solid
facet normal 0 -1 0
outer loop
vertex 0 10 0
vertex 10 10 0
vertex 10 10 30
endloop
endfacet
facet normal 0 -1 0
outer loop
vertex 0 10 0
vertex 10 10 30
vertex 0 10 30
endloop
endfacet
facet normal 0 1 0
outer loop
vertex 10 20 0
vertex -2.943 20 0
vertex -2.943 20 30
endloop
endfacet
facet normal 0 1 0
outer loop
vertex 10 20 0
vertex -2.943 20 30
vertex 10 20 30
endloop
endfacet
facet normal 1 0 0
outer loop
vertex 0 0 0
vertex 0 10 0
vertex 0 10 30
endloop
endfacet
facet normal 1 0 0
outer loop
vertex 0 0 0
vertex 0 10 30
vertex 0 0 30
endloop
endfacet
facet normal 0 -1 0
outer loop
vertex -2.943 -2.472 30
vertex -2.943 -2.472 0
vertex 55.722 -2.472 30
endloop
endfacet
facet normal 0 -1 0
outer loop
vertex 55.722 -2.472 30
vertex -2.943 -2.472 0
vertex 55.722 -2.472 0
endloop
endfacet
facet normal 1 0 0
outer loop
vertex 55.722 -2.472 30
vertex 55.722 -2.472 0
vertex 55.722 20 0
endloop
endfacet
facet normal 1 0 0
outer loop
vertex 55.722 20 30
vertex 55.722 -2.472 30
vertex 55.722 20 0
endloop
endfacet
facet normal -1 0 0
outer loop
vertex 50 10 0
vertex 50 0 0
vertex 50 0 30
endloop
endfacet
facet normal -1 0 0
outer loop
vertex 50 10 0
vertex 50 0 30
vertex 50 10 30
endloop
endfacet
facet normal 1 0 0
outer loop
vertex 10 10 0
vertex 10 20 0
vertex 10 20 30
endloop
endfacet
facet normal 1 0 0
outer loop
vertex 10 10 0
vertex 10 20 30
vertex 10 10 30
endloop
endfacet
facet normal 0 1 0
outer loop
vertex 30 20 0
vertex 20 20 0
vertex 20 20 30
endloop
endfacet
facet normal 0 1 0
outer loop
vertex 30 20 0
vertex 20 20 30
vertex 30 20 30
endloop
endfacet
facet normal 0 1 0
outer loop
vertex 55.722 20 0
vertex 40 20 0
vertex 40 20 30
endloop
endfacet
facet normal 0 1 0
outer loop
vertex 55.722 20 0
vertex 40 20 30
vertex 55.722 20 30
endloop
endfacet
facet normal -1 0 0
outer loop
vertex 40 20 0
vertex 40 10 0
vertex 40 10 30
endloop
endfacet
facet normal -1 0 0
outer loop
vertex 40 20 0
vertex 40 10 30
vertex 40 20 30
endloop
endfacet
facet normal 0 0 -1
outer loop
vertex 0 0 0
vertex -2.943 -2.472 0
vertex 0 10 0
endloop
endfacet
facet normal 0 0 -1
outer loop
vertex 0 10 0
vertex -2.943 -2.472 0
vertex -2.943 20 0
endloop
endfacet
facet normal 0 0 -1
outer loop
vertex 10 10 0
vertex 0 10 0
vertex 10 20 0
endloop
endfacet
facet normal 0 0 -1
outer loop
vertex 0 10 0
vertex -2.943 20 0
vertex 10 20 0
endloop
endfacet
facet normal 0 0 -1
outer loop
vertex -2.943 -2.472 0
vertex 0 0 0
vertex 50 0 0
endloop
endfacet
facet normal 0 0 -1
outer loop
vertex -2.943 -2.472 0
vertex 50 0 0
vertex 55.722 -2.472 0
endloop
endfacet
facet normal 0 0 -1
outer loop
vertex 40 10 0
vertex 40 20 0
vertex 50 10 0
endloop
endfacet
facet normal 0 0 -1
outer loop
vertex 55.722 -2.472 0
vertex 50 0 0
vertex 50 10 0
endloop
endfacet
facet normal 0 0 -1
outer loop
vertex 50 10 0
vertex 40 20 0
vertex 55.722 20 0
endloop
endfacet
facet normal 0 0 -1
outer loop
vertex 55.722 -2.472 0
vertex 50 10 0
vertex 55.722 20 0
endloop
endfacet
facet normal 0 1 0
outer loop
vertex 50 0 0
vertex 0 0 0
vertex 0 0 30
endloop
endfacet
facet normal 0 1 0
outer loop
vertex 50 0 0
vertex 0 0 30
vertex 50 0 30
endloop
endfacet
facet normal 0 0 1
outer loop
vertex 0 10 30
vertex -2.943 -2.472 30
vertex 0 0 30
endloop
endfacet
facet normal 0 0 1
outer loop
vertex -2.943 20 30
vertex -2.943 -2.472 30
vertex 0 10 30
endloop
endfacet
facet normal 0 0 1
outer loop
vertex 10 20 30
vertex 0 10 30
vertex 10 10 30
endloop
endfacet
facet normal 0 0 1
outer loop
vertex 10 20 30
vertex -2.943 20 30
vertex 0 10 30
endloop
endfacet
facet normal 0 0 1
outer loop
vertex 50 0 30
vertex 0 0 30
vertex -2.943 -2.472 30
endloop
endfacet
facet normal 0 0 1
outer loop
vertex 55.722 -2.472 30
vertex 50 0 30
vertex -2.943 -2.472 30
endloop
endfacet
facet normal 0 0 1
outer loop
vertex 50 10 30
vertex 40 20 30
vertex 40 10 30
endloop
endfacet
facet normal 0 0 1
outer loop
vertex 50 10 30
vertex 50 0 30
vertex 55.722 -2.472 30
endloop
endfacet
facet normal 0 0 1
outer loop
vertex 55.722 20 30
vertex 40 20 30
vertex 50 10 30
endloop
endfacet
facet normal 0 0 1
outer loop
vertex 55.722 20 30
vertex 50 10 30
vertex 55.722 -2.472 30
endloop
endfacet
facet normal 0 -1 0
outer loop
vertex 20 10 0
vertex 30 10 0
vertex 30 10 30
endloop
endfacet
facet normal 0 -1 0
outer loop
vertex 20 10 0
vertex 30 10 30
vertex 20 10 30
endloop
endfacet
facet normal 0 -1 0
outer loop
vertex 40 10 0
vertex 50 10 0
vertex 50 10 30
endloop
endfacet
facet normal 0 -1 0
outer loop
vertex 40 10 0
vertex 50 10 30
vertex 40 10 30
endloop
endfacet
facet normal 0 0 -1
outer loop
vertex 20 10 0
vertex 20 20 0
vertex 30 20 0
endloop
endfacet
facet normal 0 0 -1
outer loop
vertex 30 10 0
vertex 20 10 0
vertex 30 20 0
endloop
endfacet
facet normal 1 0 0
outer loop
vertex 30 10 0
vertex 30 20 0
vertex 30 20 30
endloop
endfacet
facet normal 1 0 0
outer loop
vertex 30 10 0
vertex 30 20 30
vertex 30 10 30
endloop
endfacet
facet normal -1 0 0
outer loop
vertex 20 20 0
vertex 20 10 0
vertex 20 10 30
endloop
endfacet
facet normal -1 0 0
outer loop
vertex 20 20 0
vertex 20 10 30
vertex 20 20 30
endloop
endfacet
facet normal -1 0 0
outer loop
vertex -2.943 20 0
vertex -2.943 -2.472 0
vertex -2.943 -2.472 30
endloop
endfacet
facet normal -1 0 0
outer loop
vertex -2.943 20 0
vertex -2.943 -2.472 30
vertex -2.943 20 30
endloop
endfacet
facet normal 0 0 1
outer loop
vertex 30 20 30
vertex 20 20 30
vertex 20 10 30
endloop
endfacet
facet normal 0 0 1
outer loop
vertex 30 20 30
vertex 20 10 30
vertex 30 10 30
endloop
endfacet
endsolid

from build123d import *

# Parameters (mm, degrees)
SKETCH3_W           = 58.664947722
SKETCH3_H           = 22.471826884
BOSS_EXTRUDE2_DEPTH = 30
CUT_EXTRUDE1_DEPTH  = 31


with BuildPart() as part:
    # Sketch3 → Boss-Extrude2 (new body)
    with BuildSketch(Plane.XY):
        with Locations((26.389266792, 8.764086558)):
            Rectangle(SKETCH3_W, SKETCH3_H)
    extrude(amount=BOSS_EXTRUDE2_DEPTH)

    # Sketch2 → Cut-Extrude1 (cut, through all)
    with BuildSketch(Plane.XY):
        Polygon((0, 0), (50, 0), (50, 10), (40, 10), (40, 20), (30, 20), (30, 10), (20, 10), (20, 20), (10, 20), (10, 10), (0, 10), align=None)
    extrude(amount=CUT_EXTRUDE1_DEPTH, mode=Mode.SUBTRACT)


solid = part.part
